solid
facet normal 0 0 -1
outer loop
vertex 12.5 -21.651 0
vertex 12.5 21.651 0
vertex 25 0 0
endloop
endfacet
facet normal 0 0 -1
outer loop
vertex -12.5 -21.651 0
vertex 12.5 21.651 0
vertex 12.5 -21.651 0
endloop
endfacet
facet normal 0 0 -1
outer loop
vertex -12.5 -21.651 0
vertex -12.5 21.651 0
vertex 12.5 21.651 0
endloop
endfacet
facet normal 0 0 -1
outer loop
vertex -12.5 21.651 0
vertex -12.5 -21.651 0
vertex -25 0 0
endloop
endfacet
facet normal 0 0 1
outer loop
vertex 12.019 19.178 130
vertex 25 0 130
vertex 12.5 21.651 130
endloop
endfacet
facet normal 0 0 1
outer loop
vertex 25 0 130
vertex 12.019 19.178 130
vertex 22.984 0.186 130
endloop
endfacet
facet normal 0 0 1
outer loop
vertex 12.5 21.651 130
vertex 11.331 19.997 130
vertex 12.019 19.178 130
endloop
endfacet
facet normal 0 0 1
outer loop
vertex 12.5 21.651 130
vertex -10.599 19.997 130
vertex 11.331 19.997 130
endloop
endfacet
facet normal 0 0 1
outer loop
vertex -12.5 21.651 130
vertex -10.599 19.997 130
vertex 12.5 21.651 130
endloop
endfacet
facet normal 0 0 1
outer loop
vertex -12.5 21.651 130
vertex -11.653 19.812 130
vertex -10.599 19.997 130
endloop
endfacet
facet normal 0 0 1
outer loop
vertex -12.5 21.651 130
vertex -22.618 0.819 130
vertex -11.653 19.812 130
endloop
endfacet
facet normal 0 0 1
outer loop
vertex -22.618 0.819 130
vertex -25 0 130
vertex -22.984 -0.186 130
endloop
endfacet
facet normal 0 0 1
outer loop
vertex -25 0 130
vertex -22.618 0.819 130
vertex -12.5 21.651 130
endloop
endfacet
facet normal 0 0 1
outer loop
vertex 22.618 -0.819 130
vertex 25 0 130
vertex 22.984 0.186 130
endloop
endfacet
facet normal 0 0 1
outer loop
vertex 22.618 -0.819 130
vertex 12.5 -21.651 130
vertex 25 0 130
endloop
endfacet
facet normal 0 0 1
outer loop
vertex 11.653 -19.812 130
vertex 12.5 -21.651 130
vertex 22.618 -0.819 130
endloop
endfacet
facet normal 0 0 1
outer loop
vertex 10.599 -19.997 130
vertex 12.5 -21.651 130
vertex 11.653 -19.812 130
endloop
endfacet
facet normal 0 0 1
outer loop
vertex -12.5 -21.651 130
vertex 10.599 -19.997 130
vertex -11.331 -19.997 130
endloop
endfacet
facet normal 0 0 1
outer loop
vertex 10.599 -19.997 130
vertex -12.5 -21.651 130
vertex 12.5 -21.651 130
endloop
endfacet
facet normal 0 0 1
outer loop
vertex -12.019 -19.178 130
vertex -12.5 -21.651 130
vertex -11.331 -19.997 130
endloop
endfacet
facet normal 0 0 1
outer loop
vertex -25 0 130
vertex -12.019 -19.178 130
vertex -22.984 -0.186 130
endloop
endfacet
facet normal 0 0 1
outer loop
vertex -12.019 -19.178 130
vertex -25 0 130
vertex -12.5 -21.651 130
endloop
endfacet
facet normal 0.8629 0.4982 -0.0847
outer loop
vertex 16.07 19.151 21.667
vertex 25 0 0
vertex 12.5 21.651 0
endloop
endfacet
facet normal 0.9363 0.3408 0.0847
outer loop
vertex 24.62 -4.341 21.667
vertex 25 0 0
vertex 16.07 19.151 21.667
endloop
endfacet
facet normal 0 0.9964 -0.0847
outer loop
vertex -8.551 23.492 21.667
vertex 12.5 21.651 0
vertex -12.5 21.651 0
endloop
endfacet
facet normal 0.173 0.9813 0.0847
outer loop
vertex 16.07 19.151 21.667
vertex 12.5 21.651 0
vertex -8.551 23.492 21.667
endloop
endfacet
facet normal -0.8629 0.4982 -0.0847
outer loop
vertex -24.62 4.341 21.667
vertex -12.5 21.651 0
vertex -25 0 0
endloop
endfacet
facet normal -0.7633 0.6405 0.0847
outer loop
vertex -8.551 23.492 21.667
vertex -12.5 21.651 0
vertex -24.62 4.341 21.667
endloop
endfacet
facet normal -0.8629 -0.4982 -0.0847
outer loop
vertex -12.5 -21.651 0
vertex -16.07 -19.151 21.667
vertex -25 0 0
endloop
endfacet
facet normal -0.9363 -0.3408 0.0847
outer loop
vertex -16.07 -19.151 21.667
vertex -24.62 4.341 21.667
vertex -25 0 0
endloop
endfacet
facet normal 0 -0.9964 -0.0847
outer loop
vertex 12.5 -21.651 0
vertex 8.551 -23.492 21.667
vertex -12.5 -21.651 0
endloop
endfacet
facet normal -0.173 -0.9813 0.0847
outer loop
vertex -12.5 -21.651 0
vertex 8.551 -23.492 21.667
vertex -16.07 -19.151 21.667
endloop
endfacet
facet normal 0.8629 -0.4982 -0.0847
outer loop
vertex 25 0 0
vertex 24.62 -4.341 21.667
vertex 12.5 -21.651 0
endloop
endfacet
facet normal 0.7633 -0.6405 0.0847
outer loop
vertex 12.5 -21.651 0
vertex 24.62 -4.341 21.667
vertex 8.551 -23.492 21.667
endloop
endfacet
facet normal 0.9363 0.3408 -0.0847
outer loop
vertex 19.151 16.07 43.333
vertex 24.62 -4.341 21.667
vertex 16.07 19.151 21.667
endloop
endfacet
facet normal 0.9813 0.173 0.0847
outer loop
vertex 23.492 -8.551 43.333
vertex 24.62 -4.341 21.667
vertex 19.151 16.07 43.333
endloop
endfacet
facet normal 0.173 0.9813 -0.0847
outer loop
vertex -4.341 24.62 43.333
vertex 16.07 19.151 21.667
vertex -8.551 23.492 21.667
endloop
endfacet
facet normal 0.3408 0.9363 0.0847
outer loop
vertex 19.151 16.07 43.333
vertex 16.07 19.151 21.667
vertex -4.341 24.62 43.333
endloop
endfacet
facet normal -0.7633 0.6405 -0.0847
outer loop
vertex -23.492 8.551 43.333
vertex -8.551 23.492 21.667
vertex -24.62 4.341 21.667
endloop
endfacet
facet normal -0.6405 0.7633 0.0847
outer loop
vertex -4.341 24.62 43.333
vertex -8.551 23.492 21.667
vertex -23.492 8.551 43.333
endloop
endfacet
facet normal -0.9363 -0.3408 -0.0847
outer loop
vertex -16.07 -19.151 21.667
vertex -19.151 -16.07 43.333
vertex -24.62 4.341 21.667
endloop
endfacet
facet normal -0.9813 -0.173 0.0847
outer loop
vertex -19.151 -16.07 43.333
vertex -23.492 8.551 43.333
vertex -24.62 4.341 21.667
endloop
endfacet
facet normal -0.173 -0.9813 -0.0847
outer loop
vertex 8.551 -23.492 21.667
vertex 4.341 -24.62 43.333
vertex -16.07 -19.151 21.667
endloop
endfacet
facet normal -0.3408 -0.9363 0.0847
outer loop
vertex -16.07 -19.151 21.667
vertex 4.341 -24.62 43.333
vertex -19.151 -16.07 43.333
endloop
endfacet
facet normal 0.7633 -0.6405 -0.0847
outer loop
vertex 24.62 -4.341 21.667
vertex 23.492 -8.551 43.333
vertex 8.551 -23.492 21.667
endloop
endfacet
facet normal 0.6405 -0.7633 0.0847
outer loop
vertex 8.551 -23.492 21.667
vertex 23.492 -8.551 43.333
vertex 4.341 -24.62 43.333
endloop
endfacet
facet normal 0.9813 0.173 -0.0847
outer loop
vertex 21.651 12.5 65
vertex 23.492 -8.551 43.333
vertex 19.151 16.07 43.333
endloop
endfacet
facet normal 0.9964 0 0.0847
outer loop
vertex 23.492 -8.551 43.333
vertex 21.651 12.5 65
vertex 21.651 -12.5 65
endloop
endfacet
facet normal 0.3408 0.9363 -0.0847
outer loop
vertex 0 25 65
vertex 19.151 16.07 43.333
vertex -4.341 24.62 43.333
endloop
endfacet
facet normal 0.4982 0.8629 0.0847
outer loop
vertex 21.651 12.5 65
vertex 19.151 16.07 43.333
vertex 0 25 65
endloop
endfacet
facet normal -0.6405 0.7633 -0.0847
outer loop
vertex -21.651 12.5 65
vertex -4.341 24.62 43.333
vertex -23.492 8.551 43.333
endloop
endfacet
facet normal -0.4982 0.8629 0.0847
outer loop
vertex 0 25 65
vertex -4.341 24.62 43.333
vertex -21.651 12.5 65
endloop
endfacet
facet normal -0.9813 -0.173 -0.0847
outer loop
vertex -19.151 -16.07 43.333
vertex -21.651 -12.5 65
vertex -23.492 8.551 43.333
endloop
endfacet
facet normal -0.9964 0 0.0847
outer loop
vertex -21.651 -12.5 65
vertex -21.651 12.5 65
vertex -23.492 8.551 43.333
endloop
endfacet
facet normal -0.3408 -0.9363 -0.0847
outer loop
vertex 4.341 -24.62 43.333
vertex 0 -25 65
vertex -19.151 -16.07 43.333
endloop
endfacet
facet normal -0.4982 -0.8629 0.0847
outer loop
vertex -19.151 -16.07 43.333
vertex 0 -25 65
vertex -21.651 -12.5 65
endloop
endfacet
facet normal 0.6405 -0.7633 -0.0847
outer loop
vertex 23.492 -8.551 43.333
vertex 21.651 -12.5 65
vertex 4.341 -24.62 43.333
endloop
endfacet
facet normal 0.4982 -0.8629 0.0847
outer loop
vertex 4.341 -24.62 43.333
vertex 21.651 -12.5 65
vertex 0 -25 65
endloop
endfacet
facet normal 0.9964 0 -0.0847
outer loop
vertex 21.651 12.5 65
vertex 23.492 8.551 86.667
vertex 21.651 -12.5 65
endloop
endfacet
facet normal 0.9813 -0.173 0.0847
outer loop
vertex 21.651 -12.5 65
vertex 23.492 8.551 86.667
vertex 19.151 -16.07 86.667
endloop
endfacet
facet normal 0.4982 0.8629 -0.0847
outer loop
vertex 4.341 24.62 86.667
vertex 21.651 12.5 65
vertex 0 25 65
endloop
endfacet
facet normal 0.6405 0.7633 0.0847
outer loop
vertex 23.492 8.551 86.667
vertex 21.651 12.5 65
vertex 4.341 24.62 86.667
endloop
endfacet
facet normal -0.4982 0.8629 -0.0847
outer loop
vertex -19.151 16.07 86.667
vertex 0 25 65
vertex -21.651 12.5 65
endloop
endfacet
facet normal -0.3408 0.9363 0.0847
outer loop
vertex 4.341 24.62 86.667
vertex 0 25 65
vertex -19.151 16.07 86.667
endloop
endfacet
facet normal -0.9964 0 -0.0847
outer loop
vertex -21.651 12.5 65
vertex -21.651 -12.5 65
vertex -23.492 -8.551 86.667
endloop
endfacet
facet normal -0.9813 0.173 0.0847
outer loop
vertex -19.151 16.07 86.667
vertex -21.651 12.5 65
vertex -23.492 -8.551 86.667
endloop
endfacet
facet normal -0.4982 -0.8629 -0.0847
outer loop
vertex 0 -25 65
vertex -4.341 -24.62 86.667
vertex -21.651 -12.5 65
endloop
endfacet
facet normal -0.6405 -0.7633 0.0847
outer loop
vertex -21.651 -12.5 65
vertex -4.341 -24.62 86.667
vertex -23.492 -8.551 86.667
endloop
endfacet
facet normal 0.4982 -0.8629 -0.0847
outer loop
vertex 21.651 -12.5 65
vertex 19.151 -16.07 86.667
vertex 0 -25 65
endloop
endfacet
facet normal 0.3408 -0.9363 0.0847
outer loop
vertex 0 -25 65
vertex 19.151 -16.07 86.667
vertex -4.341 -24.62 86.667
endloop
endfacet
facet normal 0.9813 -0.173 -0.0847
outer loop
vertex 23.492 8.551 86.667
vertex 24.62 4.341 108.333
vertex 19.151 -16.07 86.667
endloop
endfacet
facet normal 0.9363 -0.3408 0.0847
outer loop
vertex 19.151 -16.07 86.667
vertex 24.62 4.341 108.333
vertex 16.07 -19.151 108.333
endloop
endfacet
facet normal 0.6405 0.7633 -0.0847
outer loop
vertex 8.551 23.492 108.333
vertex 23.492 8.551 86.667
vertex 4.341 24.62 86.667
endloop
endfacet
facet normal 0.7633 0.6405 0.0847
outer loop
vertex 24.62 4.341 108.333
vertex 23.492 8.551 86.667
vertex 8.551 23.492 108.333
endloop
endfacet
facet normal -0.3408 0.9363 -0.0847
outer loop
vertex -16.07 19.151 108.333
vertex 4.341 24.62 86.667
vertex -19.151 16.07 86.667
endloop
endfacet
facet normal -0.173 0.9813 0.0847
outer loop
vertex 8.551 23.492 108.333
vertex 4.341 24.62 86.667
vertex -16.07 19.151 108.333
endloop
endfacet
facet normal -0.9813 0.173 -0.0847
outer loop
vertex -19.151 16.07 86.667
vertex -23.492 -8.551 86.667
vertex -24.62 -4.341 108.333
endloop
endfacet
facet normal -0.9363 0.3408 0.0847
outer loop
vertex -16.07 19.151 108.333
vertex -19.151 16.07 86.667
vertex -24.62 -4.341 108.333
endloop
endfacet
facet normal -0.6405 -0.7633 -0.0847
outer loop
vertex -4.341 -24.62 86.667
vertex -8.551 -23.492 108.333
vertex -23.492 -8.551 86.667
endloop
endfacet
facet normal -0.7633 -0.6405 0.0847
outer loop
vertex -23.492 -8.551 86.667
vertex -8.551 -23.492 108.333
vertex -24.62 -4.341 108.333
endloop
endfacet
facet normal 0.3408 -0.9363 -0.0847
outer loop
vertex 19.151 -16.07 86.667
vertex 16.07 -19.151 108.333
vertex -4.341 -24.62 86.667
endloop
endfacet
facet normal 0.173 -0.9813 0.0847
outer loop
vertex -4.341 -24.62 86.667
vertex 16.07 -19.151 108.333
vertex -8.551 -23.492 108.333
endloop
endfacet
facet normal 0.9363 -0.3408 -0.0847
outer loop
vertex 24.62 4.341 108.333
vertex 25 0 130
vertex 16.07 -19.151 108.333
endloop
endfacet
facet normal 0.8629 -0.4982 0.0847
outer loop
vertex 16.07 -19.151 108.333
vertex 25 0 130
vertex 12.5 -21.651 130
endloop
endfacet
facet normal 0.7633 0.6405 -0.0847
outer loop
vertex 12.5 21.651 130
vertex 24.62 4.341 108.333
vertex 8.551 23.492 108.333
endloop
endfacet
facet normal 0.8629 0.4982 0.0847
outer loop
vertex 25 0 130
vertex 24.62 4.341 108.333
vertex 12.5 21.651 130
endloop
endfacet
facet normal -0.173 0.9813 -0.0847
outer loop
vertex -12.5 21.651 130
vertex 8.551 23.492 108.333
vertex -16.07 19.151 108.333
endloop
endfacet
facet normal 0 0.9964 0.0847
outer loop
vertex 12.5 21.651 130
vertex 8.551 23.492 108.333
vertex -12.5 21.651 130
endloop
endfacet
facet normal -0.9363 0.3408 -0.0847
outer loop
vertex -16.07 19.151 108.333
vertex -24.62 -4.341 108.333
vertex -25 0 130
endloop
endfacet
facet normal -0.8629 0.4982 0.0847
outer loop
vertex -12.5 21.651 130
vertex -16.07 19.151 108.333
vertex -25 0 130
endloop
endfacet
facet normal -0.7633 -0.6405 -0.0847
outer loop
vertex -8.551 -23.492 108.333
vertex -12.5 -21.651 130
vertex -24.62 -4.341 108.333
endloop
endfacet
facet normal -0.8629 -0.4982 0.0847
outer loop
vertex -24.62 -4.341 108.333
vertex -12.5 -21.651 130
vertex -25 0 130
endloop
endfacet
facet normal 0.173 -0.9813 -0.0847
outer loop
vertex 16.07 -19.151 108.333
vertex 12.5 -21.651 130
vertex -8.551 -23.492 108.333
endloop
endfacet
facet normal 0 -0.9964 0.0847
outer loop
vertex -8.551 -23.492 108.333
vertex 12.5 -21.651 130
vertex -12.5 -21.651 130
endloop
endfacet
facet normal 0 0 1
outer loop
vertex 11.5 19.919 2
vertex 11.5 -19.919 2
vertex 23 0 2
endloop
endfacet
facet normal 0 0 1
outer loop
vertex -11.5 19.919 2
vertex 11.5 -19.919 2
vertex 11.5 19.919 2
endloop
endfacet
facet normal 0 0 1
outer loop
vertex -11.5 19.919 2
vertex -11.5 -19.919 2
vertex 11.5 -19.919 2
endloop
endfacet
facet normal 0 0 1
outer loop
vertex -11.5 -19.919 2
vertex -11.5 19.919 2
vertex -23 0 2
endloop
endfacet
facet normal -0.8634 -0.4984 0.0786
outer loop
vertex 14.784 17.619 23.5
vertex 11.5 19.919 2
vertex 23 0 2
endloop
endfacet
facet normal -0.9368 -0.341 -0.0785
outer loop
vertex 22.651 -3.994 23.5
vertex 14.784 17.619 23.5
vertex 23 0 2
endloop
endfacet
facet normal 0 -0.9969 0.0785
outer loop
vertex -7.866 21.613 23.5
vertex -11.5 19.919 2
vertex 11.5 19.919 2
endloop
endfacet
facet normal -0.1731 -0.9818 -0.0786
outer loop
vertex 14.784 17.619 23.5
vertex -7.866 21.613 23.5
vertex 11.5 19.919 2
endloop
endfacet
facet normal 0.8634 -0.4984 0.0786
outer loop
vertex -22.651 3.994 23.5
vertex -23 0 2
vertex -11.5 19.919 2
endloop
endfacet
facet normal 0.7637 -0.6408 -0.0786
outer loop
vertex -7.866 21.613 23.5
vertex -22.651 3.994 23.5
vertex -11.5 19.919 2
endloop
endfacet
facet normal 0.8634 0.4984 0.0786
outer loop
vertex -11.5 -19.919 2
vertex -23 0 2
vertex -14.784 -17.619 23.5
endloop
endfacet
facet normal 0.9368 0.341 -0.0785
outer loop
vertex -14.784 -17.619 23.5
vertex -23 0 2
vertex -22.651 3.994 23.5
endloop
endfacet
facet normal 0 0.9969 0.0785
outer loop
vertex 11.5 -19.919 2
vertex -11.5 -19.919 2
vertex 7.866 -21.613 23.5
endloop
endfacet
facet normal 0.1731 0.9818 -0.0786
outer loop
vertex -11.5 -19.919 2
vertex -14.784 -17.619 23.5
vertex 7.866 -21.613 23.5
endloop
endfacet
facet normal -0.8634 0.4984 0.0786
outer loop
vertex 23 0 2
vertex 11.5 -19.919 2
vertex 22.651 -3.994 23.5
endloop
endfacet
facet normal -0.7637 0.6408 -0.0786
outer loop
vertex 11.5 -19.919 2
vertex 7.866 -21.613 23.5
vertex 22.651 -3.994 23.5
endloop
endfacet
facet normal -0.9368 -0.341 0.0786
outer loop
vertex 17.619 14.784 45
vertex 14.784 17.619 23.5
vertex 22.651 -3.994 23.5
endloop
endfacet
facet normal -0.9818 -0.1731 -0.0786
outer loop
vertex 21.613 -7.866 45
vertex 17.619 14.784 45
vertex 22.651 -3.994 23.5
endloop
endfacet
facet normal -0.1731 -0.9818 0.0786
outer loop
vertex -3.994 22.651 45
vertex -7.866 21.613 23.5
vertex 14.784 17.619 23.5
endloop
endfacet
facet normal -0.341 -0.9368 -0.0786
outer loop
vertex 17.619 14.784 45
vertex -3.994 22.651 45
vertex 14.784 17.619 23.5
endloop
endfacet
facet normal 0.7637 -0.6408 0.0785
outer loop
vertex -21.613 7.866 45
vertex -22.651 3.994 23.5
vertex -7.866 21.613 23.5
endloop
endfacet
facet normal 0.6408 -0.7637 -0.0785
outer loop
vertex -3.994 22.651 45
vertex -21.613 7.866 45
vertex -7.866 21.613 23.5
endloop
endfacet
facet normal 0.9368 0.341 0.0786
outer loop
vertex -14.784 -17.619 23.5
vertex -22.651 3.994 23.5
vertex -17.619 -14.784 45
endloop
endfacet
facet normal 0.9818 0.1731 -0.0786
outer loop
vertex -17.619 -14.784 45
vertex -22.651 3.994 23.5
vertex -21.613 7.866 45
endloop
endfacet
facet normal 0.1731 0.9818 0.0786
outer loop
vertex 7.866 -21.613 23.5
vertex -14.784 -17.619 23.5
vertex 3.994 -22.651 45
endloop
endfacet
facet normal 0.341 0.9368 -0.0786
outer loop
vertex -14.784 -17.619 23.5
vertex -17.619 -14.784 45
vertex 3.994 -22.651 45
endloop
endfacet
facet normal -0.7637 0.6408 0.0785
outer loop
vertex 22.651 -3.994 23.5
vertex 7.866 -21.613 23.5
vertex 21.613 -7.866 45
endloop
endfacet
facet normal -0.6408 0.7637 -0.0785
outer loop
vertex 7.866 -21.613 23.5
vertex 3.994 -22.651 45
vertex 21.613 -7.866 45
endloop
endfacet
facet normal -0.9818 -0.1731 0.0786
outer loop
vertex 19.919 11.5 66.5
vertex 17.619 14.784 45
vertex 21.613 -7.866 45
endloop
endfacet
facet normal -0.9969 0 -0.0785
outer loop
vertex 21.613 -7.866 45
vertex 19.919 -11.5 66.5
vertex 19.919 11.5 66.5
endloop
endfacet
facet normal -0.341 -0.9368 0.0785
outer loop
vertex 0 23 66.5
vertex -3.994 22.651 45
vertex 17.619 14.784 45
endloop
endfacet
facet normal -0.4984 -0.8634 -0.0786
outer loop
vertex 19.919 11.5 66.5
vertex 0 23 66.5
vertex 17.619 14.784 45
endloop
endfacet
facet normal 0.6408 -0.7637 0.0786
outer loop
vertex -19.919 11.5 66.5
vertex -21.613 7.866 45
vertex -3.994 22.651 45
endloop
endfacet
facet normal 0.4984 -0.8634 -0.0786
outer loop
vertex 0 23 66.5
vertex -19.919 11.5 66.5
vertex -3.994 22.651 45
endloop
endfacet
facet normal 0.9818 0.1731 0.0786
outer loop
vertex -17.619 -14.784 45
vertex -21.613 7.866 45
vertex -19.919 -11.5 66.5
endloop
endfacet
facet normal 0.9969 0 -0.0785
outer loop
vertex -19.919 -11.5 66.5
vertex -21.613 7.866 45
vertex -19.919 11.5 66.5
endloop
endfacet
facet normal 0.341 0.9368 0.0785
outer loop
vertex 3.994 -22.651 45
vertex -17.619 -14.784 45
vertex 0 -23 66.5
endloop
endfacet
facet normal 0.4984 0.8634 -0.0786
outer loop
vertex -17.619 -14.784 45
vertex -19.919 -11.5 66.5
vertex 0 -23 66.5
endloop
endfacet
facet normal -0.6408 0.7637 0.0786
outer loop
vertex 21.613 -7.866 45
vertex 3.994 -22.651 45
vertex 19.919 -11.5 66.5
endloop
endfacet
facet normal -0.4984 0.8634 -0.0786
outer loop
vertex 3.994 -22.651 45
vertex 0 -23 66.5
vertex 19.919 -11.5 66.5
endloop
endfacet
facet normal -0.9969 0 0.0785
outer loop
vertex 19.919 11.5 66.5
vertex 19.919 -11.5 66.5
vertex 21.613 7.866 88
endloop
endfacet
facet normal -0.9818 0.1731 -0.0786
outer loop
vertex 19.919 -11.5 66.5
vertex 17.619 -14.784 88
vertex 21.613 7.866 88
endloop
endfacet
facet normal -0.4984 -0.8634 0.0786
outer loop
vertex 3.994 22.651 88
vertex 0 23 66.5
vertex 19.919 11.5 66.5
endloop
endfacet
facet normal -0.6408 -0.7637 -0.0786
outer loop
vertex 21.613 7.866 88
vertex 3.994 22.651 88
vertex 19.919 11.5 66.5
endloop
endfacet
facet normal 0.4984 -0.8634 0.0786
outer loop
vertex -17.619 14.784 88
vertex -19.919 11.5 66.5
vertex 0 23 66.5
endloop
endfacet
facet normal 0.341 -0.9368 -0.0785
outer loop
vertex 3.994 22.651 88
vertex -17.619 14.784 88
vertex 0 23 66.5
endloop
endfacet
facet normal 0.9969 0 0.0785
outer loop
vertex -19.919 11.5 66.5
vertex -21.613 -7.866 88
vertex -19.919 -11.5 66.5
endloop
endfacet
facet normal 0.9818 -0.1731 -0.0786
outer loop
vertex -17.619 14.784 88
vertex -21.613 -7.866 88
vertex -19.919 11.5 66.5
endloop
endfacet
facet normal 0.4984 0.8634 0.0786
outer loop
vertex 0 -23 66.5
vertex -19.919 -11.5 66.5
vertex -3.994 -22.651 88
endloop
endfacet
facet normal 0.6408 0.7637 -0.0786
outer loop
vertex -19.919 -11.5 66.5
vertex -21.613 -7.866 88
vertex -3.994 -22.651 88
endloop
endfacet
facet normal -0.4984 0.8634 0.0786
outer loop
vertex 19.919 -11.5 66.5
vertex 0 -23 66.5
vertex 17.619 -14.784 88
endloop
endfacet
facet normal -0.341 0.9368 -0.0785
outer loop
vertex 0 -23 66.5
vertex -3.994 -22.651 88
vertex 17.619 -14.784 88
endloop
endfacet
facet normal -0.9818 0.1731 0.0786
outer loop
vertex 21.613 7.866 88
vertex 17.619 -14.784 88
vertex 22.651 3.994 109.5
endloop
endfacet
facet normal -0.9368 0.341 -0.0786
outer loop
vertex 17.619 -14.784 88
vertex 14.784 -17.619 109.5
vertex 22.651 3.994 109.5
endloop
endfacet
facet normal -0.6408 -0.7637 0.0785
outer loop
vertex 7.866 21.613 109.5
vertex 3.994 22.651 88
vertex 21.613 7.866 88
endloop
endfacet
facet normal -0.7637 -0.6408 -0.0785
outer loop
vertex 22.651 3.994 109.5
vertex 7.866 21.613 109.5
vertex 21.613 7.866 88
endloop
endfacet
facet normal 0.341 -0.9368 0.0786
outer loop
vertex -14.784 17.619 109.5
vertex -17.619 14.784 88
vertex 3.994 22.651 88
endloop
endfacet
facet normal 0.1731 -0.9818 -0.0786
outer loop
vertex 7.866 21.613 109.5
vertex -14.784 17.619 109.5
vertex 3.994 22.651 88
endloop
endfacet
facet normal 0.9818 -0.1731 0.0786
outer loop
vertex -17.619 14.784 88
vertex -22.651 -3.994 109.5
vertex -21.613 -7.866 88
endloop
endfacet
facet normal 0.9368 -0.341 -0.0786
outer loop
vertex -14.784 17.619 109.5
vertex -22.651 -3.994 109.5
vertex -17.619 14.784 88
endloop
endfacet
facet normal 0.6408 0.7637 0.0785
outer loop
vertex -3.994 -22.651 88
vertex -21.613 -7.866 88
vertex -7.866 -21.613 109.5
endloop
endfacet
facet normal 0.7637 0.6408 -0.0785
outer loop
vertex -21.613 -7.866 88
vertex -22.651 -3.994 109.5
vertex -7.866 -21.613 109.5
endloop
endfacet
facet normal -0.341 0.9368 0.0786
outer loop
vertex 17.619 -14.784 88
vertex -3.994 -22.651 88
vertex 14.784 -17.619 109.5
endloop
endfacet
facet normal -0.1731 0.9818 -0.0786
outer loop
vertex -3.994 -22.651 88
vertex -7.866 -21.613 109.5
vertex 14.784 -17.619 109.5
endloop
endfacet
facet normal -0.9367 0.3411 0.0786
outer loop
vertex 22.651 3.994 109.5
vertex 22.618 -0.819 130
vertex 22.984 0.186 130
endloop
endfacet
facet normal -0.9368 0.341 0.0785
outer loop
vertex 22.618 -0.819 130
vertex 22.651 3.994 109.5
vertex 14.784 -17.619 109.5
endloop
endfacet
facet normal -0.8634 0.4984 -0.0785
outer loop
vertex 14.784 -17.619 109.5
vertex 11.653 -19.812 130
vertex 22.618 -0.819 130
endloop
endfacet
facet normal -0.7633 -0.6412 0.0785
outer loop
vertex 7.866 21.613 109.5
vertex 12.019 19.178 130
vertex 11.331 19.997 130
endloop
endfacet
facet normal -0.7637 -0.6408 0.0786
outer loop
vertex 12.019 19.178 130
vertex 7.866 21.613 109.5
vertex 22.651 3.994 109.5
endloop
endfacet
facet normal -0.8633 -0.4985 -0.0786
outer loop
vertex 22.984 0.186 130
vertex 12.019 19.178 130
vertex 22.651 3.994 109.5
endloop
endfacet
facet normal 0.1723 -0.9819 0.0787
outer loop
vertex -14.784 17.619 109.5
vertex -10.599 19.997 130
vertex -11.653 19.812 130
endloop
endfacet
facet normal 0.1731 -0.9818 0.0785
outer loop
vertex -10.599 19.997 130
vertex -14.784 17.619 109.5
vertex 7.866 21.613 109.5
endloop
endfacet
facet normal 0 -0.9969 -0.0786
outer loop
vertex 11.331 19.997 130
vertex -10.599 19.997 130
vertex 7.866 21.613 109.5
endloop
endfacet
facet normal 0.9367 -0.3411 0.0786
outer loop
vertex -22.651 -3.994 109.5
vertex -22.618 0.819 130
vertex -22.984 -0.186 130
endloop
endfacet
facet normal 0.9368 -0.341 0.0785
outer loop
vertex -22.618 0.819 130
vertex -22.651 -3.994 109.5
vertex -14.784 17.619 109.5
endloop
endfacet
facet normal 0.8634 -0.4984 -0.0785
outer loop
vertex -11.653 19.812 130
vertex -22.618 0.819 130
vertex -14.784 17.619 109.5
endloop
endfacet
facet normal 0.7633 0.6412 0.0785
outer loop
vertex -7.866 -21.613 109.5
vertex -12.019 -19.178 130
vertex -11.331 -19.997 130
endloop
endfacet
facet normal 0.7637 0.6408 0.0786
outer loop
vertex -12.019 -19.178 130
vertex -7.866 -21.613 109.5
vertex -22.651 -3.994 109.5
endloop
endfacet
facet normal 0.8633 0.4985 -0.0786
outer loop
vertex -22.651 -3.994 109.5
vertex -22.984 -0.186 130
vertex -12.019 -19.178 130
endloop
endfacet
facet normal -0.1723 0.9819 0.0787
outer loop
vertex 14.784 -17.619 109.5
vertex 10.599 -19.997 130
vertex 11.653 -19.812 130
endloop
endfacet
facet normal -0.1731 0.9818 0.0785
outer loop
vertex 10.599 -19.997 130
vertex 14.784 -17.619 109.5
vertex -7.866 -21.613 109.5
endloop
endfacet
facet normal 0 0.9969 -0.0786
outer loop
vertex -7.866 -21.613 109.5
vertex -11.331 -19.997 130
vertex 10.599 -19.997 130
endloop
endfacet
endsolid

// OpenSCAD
// [FL_INDEX: keywords="openscad, 3d_parametric, Twisted_Vase, csg_solid" | COT="Parametric OpenSCAD design from 3DCodeverse"]
// Title: Twisted Vase

radius = 25;//[5:100]
wall = 2;//[1:10]
height = 130;//[50:150]
twist = 60;//[0:180]


difference(){
linear_extrude(height = height, center = false, convexity = 0, twist = twist, slices=height/20)
circle(r = radius, $fn=6);
translate([0,0,wall])
linear_extrude(height=height-wall+1, center=false, convexity=0, twist=twist, slices=height/20)
circle(r = radius-wall, $fn=6);
}
